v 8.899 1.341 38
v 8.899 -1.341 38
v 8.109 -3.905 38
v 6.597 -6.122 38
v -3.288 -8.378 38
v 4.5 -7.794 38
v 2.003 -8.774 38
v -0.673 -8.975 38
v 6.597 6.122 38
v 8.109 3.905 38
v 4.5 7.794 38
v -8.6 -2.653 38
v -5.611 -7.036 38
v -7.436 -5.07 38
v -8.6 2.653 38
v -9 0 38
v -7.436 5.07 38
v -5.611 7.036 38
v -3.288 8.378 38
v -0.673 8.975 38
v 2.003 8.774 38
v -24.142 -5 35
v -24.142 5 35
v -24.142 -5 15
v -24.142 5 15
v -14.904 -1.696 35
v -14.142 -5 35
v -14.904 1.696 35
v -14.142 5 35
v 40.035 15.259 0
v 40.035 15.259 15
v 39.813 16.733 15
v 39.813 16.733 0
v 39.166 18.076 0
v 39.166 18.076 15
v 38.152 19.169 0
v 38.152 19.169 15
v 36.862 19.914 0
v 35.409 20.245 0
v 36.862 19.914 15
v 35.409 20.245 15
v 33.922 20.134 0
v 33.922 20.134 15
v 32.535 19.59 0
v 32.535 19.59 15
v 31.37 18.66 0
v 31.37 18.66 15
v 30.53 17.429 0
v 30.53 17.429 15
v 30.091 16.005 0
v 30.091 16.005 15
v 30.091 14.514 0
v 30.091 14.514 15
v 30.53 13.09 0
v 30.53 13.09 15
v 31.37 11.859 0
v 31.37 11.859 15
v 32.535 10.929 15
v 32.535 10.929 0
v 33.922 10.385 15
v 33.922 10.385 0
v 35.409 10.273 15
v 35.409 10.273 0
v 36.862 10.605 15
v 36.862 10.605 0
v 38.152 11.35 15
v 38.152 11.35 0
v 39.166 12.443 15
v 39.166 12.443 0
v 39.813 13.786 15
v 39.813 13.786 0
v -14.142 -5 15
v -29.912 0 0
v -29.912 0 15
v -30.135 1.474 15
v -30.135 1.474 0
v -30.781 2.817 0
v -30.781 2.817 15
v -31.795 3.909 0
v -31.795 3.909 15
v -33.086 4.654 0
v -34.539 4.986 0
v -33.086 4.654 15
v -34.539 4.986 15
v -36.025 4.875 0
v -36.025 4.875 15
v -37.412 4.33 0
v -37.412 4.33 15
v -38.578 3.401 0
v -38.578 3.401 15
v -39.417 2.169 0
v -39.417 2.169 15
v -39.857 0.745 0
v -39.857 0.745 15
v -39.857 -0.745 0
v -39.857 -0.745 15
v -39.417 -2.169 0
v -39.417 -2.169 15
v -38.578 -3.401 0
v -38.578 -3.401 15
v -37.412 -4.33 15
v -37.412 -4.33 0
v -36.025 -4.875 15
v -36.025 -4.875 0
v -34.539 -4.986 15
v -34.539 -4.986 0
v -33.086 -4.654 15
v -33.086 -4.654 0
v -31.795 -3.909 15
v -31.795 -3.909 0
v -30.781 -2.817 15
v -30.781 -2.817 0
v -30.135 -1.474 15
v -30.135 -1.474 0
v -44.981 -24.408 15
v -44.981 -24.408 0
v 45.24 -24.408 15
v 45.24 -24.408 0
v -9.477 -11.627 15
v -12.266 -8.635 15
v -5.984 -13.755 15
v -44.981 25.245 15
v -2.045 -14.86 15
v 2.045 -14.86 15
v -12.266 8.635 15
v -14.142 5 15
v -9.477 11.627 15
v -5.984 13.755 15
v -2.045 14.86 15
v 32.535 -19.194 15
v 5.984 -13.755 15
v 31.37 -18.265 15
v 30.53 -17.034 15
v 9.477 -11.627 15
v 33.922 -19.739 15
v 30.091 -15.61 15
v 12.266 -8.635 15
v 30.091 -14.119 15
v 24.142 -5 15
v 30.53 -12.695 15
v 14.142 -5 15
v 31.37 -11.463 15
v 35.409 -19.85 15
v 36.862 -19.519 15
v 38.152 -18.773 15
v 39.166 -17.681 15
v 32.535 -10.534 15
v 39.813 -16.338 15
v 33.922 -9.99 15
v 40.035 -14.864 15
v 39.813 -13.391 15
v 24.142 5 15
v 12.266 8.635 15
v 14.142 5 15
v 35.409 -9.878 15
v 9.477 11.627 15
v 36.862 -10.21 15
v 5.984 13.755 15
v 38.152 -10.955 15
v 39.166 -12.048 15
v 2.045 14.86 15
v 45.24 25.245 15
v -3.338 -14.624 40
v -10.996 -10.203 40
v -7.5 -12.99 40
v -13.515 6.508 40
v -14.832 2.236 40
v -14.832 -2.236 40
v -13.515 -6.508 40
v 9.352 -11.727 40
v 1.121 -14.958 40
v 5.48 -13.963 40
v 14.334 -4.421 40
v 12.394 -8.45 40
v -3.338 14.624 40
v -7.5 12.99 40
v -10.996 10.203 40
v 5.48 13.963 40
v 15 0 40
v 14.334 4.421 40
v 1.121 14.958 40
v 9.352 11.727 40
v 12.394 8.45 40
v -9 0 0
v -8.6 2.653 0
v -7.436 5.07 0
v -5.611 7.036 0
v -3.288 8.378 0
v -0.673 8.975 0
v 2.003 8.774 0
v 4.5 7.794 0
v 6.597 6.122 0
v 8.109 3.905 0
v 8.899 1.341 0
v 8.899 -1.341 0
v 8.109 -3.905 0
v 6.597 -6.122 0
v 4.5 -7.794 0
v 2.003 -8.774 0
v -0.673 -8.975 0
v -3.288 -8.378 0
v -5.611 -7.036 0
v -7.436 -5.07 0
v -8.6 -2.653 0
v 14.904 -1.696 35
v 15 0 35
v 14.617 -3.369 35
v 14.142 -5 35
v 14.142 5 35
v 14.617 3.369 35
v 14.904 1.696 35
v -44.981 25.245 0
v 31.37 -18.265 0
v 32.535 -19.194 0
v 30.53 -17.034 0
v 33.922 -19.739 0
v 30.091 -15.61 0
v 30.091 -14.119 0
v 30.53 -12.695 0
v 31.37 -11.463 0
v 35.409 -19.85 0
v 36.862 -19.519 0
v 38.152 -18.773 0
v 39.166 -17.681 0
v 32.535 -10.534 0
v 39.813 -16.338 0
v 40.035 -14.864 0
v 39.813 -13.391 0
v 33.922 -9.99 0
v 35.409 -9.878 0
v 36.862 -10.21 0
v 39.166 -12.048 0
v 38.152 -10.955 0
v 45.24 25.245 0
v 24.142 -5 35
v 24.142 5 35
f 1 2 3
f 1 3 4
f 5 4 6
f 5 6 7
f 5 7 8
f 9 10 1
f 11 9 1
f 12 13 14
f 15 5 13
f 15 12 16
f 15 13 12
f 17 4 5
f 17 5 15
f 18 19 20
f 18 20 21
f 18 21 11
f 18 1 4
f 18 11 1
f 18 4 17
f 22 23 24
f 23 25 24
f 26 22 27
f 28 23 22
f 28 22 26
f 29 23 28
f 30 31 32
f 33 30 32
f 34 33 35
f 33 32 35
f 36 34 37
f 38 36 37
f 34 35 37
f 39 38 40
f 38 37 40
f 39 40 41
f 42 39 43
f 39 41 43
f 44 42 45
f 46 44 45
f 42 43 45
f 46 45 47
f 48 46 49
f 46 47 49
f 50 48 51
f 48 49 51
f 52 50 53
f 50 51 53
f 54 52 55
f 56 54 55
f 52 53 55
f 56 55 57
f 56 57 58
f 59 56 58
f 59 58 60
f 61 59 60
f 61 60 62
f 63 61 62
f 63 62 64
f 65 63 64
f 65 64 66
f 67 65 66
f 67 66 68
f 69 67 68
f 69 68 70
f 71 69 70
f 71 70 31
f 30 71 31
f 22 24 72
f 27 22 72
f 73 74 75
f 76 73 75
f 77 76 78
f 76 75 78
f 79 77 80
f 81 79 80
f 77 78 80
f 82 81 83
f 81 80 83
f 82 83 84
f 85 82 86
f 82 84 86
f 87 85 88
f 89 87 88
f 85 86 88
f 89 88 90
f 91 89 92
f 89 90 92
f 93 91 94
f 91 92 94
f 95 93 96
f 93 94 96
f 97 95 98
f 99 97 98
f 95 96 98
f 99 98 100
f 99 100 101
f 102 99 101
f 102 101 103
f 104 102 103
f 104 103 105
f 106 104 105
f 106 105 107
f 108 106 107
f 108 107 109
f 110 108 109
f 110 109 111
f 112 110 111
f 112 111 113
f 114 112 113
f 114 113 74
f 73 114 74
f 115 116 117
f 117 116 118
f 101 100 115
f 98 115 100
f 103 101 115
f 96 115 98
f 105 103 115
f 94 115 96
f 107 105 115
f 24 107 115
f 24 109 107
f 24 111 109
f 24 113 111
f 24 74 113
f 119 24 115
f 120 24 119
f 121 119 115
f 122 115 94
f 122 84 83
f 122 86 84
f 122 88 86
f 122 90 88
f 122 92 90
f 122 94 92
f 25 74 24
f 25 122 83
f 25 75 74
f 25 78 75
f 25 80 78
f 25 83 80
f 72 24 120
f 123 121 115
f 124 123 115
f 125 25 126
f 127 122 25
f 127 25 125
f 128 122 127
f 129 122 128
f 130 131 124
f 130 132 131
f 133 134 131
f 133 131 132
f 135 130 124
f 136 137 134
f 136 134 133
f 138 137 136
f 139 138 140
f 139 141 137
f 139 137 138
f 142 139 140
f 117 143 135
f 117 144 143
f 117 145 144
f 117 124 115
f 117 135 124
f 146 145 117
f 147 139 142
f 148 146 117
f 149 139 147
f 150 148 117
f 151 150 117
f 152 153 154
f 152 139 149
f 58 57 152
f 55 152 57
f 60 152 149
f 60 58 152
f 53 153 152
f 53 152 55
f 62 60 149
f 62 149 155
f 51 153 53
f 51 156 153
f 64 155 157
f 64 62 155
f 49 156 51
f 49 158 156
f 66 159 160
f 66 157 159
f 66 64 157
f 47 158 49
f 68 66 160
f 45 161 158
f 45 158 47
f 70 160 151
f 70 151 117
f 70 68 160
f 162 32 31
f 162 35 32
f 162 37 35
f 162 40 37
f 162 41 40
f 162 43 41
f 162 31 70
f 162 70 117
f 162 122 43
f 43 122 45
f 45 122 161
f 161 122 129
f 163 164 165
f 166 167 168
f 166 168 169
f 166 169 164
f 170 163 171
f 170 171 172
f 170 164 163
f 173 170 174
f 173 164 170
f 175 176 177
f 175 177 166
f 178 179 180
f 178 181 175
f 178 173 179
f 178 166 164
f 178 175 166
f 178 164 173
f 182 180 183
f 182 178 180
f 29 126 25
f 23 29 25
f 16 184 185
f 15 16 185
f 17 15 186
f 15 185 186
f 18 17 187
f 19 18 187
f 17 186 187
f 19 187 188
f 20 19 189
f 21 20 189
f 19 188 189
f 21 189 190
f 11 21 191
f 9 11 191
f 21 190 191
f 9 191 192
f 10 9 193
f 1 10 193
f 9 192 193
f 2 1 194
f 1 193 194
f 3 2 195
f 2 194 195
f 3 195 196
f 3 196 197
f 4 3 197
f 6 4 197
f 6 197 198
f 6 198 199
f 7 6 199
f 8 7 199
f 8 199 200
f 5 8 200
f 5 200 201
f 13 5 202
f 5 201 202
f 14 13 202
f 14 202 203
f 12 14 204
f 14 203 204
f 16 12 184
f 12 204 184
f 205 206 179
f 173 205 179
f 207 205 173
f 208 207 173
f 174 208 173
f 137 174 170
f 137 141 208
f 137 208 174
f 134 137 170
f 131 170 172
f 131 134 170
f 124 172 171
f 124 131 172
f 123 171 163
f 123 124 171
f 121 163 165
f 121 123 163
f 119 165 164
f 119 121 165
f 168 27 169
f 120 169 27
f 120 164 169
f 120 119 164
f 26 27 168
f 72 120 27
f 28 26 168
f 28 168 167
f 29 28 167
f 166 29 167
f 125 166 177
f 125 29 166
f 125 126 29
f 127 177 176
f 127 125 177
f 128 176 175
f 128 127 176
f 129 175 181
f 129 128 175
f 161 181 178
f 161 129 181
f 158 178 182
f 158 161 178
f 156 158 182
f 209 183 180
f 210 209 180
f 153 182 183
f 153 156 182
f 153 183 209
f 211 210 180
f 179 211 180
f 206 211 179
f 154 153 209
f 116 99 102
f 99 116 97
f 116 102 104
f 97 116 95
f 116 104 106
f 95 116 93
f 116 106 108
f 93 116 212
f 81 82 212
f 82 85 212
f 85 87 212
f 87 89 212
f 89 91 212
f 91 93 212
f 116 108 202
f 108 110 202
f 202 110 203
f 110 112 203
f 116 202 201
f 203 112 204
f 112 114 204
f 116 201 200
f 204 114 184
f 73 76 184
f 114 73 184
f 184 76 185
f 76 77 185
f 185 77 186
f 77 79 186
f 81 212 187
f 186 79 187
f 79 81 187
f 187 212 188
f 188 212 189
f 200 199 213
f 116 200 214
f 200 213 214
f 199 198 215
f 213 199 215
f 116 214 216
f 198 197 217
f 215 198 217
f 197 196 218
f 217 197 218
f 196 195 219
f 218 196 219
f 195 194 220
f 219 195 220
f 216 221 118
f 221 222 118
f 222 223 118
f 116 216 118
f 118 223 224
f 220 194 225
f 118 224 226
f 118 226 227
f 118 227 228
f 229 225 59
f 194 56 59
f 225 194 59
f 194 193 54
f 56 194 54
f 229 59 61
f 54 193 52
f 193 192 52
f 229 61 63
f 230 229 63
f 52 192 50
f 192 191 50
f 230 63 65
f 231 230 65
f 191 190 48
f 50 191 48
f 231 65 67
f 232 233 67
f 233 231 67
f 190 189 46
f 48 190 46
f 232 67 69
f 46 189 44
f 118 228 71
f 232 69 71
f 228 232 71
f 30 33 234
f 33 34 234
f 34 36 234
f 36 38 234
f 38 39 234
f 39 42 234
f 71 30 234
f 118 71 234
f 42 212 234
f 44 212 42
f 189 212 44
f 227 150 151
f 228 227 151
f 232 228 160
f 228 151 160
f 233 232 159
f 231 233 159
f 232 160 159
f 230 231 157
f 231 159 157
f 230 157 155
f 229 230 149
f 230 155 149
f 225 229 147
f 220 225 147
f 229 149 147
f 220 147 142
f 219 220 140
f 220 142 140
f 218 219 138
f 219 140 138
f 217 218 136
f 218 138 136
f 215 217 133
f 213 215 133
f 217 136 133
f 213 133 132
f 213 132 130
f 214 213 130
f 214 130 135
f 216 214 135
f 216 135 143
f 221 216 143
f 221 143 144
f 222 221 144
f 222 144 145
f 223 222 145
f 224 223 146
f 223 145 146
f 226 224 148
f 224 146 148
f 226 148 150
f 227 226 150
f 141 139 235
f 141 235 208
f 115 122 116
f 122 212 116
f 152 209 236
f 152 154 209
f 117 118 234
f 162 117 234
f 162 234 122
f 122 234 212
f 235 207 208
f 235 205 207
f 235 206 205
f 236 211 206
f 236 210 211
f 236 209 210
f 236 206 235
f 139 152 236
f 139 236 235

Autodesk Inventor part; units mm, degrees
ref_plane "YZ Plane" through (0, 0, 0) normal (1, 0, 0) x (0, 1, 0)
ref_plane "XZ Plane" through (0, 0, 0) normal (0, 1, 0) x (-1, 0, 0)
ref_plane "XY Plane" through (0, 0, 0) normal (0, 0, 1) x (1, 0, 0)
sketch "Эскиз4" plane through (0, 0, 0) normal (0, 0, 1) x (1, 0, 0)
  line L0 (45.2395, 25.2453) -> (-44.981, 25.2453)
  line L1 (-44.981, 25.2453) -> (-44.981, -24.4084)
  line L2 (-44.981, -24.4084) -> (45.2395, -24.4084)
  line L3 (45.2395, -24.4084) -> (45.2395, 25.2453)
  point P0 (0, 0)
extrude "Прямоугольник_" add sketch "Эскиз4" along normal blind 15
sketch "Прямоугольник" plane through (0, 0, 0) normal (0, 0, 1) x (1, 0, 0)
  line L0 (-77.4921, 158.0418) -> (133.4103, 158.0418) construction
  line L1 (133.4103, 158.0418) -> (133.4103, -71.9132) construction
  line L2 (133.4103, -71.9132) -> (-77.4921, -71.9132) construction
  line L3 (-77.4921, -71.9132) -> (-77.4921, 158.0418) construction
  line L4 (44.9907, 25.2614) -> (-45.0093, 25.2614)
  line L5 (-45.0093, 25.2614) -> (-45.0093, -24.7386)
  line L6 (-45.0093, -24.7386) -> (44.9907, -24.7386)
  line L7 (44.9907, -24.7386) -> (44.9907, 25.2614)
  point P0 (0, 0)
  dimension "d17" = 90
  dimension "d20" = 50
sketch "Три отверстия по краям" plane through (0, 0, 15) normal (0, 0, 1) x (1, 0, 0)
  circle A0 centre (-34.9124, 0) radius 5
  circle A1 centre (35.035, 15.2594) radius 5
  circle A2 centre (35.035, -14.8643) radius 5
  point P0 (0, 0)
  dimension "d12" = 10
  dimension "d13" = 10
  dimension "d14" = 10
extrude "3 отверстия по краям" cut sketch "Три отверстия по краям" against normal blind 800
sketch "Возвышенность по центру" plane through (0, 0, 15) normal (0, 0, 1) x (1, 0, 0)
  circle A0 centre (0, 0) radius 15
  dimension "d21" = 30
extrude "Возвышенность" add sketch "Возвышенность по центру" along normal blind 25
sketch "Эскиз7" plane through (0, 0, 0) normal (0, 0, -1) x (-1, 0, 0)
  circle A0 centre (0, 0) radius 9
  dimension "d24" = 18
extrude "Внутренняя часть внутри возв" cut sketch "Эскиз7" against normal blind 38
sketch "Эскиз8" plane through (0, 0, 15) normal (0, 0, 1) x (1, 0, 0)
  circle A0 centre (0, 0) radius 15 projected
  line L0 (45.2395, -24.4084) -> (45.2395, 25.2453) projected
  line L1 (-14.1421, 5) -> (-24.1421, 5)
  line L2 (-24.1421, 5) -> (-24.1421, -5)
  line L3 (-24.1421, -5) -> (-14.1421, -5)
  line L4 (14.1421, 5) -> (24.1421, 5)
  line L5 (24.1421, 5) -> (24.1421, -5)
  line L6 (24.1421, -5) -> (14.1421, -5)
  dimension "d27" = 10
  dimension "d28" = 10
  dimension "d29" = 10
extrude "Детали по бокам возв." add sketch "Эскиз8" along normal blind 20 contours A0 L4 L5 L6 | A0 L3 L2 L1
properties part number "Основание"
